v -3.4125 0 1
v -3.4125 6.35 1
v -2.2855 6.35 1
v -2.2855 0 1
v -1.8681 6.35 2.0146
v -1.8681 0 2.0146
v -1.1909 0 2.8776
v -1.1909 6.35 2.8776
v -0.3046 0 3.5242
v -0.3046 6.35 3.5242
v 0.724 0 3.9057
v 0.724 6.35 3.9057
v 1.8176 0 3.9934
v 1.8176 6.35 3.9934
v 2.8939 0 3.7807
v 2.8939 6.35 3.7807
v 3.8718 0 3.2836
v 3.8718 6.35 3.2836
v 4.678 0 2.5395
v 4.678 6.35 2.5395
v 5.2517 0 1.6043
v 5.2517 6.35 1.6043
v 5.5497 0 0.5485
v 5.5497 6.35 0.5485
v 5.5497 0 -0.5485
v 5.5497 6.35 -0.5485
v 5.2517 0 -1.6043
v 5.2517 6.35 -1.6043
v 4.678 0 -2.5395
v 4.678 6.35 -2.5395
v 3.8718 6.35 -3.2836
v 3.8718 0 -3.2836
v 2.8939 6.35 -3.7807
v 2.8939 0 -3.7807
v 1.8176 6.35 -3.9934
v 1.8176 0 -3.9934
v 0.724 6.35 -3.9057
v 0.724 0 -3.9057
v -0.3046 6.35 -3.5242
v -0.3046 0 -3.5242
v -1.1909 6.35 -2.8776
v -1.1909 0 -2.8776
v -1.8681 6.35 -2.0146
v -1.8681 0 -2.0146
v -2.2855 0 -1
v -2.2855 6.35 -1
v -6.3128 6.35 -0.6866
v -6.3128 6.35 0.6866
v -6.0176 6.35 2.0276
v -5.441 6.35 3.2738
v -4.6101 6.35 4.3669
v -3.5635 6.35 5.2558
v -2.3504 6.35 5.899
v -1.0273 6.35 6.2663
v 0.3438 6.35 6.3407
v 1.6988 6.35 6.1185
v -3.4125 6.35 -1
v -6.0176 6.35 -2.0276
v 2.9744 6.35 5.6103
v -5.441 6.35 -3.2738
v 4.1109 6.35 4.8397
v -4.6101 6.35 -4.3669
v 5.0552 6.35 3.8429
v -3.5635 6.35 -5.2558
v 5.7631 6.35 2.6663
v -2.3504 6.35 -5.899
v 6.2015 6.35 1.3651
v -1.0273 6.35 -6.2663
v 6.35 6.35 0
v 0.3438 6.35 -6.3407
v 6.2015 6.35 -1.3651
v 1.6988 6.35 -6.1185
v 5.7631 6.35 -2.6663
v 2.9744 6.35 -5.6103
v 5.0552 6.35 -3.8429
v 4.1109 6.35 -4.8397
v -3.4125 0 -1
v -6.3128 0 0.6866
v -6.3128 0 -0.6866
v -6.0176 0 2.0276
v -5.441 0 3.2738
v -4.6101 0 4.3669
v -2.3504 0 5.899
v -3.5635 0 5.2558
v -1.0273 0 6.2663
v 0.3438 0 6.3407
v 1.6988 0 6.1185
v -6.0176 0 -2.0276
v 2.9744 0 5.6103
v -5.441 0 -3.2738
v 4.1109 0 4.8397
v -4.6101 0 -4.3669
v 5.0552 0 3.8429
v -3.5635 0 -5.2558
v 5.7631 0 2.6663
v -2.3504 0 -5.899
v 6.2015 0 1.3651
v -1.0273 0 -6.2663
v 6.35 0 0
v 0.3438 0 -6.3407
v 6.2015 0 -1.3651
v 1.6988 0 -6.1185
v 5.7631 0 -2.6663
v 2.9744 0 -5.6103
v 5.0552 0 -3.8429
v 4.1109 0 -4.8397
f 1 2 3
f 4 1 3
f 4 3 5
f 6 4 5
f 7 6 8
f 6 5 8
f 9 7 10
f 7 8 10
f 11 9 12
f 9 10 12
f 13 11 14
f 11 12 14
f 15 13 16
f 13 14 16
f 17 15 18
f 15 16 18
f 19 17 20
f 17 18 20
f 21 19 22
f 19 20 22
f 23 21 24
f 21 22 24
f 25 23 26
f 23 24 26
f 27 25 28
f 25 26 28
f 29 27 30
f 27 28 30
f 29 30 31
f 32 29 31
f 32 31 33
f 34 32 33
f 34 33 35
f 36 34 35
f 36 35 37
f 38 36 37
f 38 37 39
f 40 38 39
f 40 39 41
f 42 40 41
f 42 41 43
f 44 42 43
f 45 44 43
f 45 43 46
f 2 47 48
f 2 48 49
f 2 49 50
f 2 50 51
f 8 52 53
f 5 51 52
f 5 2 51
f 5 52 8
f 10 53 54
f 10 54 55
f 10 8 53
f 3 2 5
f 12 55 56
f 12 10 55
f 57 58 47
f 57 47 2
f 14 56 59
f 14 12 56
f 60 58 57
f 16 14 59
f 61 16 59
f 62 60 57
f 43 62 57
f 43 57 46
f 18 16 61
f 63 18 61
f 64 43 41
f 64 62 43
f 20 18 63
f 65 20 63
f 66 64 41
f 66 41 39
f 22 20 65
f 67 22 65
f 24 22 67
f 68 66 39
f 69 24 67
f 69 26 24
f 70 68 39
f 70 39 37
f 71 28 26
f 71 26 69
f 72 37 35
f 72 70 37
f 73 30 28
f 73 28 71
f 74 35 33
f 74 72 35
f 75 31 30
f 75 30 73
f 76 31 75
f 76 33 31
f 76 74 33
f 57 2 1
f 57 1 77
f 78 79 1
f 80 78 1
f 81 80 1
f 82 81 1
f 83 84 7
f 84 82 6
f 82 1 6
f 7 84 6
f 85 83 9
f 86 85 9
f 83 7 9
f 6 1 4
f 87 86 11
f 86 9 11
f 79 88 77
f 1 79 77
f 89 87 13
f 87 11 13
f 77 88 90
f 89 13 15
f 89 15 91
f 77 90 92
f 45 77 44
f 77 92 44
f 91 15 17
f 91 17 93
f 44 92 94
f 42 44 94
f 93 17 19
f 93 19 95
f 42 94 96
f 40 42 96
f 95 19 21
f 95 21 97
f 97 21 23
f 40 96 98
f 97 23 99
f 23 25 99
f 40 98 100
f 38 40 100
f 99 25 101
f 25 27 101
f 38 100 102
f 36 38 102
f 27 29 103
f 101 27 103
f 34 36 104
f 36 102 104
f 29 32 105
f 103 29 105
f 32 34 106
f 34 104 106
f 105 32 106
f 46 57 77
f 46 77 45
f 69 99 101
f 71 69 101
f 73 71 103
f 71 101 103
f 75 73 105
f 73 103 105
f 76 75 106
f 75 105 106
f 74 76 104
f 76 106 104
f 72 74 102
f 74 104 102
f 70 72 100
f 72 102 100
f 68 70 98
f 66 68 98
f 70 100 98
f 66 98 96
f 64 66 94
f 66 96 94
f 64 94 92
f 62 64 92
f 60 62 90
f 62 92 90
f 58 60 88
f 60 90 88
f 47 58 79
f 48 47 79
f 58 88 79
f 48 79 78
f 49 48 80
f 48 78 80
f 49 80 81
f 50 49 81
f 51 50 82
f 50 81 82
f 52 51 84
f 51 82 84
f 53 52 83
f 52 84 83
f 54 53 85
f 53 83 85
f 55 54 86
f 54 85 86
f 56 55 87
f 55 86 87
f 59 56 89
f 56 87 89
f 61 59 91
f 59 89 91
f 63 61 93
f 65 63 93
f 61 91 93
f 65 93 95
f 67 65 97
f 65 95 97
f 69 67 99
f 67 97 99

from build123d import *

# Parameters (mm, degrees)
SKETCH1_R           = 6.35
BOSS_EXTRUDE1_DEPTH = 6.35
SKETCH2_R           = 4
CUT_EXTRUDE1_DEPTH  = 6.35
SKETCH3_W           = 2
SKETCH3_H           = 2
CUT_EXTRUDE2_DEPTH  = 6.35


with BuildPart() as part:
    # Sketch1 → Boss-Extrude1 (new body)
    with BuildSketch(Plane(origin=(0, 0, 0), x_dir=(1, 0, 0), z_dir=(0, 1, 0))):
        Circle(SKETCH1_R)
    extrude(amount=BOSS_EXTRUDE1_DEPTH)

    # Sketch2 → Cut-Extrude1 (cut)
    with BuildSketch(Plane(origin=(0, 6.35, 0), x_dir=(1, 0, 0), z_dir=(0, 1, 0))):
        with Locations((1.5875, 0)):
            Circle(SKETCH2_R)
    extrude(amount=-CUT_EXTRUDE1_DEPTH, mode=Mode.SUBTRACT)

    # Sketch3 → Cut-Extrude2 (cut)
    with BuildSketch(Plane(origin=(0, 6.35, 0), x_dir=(1, 0, 0), z_dir=(0, 1, 0))):
        with Locations((-2.4125, 0)):
            Rectangle(SKETCH3_W, SKETCH3_H)
    extrude(amount=-CUT_EXTRUDE2_DEPTH, mode=Mode.SUBTRACT)


solid = part.part
